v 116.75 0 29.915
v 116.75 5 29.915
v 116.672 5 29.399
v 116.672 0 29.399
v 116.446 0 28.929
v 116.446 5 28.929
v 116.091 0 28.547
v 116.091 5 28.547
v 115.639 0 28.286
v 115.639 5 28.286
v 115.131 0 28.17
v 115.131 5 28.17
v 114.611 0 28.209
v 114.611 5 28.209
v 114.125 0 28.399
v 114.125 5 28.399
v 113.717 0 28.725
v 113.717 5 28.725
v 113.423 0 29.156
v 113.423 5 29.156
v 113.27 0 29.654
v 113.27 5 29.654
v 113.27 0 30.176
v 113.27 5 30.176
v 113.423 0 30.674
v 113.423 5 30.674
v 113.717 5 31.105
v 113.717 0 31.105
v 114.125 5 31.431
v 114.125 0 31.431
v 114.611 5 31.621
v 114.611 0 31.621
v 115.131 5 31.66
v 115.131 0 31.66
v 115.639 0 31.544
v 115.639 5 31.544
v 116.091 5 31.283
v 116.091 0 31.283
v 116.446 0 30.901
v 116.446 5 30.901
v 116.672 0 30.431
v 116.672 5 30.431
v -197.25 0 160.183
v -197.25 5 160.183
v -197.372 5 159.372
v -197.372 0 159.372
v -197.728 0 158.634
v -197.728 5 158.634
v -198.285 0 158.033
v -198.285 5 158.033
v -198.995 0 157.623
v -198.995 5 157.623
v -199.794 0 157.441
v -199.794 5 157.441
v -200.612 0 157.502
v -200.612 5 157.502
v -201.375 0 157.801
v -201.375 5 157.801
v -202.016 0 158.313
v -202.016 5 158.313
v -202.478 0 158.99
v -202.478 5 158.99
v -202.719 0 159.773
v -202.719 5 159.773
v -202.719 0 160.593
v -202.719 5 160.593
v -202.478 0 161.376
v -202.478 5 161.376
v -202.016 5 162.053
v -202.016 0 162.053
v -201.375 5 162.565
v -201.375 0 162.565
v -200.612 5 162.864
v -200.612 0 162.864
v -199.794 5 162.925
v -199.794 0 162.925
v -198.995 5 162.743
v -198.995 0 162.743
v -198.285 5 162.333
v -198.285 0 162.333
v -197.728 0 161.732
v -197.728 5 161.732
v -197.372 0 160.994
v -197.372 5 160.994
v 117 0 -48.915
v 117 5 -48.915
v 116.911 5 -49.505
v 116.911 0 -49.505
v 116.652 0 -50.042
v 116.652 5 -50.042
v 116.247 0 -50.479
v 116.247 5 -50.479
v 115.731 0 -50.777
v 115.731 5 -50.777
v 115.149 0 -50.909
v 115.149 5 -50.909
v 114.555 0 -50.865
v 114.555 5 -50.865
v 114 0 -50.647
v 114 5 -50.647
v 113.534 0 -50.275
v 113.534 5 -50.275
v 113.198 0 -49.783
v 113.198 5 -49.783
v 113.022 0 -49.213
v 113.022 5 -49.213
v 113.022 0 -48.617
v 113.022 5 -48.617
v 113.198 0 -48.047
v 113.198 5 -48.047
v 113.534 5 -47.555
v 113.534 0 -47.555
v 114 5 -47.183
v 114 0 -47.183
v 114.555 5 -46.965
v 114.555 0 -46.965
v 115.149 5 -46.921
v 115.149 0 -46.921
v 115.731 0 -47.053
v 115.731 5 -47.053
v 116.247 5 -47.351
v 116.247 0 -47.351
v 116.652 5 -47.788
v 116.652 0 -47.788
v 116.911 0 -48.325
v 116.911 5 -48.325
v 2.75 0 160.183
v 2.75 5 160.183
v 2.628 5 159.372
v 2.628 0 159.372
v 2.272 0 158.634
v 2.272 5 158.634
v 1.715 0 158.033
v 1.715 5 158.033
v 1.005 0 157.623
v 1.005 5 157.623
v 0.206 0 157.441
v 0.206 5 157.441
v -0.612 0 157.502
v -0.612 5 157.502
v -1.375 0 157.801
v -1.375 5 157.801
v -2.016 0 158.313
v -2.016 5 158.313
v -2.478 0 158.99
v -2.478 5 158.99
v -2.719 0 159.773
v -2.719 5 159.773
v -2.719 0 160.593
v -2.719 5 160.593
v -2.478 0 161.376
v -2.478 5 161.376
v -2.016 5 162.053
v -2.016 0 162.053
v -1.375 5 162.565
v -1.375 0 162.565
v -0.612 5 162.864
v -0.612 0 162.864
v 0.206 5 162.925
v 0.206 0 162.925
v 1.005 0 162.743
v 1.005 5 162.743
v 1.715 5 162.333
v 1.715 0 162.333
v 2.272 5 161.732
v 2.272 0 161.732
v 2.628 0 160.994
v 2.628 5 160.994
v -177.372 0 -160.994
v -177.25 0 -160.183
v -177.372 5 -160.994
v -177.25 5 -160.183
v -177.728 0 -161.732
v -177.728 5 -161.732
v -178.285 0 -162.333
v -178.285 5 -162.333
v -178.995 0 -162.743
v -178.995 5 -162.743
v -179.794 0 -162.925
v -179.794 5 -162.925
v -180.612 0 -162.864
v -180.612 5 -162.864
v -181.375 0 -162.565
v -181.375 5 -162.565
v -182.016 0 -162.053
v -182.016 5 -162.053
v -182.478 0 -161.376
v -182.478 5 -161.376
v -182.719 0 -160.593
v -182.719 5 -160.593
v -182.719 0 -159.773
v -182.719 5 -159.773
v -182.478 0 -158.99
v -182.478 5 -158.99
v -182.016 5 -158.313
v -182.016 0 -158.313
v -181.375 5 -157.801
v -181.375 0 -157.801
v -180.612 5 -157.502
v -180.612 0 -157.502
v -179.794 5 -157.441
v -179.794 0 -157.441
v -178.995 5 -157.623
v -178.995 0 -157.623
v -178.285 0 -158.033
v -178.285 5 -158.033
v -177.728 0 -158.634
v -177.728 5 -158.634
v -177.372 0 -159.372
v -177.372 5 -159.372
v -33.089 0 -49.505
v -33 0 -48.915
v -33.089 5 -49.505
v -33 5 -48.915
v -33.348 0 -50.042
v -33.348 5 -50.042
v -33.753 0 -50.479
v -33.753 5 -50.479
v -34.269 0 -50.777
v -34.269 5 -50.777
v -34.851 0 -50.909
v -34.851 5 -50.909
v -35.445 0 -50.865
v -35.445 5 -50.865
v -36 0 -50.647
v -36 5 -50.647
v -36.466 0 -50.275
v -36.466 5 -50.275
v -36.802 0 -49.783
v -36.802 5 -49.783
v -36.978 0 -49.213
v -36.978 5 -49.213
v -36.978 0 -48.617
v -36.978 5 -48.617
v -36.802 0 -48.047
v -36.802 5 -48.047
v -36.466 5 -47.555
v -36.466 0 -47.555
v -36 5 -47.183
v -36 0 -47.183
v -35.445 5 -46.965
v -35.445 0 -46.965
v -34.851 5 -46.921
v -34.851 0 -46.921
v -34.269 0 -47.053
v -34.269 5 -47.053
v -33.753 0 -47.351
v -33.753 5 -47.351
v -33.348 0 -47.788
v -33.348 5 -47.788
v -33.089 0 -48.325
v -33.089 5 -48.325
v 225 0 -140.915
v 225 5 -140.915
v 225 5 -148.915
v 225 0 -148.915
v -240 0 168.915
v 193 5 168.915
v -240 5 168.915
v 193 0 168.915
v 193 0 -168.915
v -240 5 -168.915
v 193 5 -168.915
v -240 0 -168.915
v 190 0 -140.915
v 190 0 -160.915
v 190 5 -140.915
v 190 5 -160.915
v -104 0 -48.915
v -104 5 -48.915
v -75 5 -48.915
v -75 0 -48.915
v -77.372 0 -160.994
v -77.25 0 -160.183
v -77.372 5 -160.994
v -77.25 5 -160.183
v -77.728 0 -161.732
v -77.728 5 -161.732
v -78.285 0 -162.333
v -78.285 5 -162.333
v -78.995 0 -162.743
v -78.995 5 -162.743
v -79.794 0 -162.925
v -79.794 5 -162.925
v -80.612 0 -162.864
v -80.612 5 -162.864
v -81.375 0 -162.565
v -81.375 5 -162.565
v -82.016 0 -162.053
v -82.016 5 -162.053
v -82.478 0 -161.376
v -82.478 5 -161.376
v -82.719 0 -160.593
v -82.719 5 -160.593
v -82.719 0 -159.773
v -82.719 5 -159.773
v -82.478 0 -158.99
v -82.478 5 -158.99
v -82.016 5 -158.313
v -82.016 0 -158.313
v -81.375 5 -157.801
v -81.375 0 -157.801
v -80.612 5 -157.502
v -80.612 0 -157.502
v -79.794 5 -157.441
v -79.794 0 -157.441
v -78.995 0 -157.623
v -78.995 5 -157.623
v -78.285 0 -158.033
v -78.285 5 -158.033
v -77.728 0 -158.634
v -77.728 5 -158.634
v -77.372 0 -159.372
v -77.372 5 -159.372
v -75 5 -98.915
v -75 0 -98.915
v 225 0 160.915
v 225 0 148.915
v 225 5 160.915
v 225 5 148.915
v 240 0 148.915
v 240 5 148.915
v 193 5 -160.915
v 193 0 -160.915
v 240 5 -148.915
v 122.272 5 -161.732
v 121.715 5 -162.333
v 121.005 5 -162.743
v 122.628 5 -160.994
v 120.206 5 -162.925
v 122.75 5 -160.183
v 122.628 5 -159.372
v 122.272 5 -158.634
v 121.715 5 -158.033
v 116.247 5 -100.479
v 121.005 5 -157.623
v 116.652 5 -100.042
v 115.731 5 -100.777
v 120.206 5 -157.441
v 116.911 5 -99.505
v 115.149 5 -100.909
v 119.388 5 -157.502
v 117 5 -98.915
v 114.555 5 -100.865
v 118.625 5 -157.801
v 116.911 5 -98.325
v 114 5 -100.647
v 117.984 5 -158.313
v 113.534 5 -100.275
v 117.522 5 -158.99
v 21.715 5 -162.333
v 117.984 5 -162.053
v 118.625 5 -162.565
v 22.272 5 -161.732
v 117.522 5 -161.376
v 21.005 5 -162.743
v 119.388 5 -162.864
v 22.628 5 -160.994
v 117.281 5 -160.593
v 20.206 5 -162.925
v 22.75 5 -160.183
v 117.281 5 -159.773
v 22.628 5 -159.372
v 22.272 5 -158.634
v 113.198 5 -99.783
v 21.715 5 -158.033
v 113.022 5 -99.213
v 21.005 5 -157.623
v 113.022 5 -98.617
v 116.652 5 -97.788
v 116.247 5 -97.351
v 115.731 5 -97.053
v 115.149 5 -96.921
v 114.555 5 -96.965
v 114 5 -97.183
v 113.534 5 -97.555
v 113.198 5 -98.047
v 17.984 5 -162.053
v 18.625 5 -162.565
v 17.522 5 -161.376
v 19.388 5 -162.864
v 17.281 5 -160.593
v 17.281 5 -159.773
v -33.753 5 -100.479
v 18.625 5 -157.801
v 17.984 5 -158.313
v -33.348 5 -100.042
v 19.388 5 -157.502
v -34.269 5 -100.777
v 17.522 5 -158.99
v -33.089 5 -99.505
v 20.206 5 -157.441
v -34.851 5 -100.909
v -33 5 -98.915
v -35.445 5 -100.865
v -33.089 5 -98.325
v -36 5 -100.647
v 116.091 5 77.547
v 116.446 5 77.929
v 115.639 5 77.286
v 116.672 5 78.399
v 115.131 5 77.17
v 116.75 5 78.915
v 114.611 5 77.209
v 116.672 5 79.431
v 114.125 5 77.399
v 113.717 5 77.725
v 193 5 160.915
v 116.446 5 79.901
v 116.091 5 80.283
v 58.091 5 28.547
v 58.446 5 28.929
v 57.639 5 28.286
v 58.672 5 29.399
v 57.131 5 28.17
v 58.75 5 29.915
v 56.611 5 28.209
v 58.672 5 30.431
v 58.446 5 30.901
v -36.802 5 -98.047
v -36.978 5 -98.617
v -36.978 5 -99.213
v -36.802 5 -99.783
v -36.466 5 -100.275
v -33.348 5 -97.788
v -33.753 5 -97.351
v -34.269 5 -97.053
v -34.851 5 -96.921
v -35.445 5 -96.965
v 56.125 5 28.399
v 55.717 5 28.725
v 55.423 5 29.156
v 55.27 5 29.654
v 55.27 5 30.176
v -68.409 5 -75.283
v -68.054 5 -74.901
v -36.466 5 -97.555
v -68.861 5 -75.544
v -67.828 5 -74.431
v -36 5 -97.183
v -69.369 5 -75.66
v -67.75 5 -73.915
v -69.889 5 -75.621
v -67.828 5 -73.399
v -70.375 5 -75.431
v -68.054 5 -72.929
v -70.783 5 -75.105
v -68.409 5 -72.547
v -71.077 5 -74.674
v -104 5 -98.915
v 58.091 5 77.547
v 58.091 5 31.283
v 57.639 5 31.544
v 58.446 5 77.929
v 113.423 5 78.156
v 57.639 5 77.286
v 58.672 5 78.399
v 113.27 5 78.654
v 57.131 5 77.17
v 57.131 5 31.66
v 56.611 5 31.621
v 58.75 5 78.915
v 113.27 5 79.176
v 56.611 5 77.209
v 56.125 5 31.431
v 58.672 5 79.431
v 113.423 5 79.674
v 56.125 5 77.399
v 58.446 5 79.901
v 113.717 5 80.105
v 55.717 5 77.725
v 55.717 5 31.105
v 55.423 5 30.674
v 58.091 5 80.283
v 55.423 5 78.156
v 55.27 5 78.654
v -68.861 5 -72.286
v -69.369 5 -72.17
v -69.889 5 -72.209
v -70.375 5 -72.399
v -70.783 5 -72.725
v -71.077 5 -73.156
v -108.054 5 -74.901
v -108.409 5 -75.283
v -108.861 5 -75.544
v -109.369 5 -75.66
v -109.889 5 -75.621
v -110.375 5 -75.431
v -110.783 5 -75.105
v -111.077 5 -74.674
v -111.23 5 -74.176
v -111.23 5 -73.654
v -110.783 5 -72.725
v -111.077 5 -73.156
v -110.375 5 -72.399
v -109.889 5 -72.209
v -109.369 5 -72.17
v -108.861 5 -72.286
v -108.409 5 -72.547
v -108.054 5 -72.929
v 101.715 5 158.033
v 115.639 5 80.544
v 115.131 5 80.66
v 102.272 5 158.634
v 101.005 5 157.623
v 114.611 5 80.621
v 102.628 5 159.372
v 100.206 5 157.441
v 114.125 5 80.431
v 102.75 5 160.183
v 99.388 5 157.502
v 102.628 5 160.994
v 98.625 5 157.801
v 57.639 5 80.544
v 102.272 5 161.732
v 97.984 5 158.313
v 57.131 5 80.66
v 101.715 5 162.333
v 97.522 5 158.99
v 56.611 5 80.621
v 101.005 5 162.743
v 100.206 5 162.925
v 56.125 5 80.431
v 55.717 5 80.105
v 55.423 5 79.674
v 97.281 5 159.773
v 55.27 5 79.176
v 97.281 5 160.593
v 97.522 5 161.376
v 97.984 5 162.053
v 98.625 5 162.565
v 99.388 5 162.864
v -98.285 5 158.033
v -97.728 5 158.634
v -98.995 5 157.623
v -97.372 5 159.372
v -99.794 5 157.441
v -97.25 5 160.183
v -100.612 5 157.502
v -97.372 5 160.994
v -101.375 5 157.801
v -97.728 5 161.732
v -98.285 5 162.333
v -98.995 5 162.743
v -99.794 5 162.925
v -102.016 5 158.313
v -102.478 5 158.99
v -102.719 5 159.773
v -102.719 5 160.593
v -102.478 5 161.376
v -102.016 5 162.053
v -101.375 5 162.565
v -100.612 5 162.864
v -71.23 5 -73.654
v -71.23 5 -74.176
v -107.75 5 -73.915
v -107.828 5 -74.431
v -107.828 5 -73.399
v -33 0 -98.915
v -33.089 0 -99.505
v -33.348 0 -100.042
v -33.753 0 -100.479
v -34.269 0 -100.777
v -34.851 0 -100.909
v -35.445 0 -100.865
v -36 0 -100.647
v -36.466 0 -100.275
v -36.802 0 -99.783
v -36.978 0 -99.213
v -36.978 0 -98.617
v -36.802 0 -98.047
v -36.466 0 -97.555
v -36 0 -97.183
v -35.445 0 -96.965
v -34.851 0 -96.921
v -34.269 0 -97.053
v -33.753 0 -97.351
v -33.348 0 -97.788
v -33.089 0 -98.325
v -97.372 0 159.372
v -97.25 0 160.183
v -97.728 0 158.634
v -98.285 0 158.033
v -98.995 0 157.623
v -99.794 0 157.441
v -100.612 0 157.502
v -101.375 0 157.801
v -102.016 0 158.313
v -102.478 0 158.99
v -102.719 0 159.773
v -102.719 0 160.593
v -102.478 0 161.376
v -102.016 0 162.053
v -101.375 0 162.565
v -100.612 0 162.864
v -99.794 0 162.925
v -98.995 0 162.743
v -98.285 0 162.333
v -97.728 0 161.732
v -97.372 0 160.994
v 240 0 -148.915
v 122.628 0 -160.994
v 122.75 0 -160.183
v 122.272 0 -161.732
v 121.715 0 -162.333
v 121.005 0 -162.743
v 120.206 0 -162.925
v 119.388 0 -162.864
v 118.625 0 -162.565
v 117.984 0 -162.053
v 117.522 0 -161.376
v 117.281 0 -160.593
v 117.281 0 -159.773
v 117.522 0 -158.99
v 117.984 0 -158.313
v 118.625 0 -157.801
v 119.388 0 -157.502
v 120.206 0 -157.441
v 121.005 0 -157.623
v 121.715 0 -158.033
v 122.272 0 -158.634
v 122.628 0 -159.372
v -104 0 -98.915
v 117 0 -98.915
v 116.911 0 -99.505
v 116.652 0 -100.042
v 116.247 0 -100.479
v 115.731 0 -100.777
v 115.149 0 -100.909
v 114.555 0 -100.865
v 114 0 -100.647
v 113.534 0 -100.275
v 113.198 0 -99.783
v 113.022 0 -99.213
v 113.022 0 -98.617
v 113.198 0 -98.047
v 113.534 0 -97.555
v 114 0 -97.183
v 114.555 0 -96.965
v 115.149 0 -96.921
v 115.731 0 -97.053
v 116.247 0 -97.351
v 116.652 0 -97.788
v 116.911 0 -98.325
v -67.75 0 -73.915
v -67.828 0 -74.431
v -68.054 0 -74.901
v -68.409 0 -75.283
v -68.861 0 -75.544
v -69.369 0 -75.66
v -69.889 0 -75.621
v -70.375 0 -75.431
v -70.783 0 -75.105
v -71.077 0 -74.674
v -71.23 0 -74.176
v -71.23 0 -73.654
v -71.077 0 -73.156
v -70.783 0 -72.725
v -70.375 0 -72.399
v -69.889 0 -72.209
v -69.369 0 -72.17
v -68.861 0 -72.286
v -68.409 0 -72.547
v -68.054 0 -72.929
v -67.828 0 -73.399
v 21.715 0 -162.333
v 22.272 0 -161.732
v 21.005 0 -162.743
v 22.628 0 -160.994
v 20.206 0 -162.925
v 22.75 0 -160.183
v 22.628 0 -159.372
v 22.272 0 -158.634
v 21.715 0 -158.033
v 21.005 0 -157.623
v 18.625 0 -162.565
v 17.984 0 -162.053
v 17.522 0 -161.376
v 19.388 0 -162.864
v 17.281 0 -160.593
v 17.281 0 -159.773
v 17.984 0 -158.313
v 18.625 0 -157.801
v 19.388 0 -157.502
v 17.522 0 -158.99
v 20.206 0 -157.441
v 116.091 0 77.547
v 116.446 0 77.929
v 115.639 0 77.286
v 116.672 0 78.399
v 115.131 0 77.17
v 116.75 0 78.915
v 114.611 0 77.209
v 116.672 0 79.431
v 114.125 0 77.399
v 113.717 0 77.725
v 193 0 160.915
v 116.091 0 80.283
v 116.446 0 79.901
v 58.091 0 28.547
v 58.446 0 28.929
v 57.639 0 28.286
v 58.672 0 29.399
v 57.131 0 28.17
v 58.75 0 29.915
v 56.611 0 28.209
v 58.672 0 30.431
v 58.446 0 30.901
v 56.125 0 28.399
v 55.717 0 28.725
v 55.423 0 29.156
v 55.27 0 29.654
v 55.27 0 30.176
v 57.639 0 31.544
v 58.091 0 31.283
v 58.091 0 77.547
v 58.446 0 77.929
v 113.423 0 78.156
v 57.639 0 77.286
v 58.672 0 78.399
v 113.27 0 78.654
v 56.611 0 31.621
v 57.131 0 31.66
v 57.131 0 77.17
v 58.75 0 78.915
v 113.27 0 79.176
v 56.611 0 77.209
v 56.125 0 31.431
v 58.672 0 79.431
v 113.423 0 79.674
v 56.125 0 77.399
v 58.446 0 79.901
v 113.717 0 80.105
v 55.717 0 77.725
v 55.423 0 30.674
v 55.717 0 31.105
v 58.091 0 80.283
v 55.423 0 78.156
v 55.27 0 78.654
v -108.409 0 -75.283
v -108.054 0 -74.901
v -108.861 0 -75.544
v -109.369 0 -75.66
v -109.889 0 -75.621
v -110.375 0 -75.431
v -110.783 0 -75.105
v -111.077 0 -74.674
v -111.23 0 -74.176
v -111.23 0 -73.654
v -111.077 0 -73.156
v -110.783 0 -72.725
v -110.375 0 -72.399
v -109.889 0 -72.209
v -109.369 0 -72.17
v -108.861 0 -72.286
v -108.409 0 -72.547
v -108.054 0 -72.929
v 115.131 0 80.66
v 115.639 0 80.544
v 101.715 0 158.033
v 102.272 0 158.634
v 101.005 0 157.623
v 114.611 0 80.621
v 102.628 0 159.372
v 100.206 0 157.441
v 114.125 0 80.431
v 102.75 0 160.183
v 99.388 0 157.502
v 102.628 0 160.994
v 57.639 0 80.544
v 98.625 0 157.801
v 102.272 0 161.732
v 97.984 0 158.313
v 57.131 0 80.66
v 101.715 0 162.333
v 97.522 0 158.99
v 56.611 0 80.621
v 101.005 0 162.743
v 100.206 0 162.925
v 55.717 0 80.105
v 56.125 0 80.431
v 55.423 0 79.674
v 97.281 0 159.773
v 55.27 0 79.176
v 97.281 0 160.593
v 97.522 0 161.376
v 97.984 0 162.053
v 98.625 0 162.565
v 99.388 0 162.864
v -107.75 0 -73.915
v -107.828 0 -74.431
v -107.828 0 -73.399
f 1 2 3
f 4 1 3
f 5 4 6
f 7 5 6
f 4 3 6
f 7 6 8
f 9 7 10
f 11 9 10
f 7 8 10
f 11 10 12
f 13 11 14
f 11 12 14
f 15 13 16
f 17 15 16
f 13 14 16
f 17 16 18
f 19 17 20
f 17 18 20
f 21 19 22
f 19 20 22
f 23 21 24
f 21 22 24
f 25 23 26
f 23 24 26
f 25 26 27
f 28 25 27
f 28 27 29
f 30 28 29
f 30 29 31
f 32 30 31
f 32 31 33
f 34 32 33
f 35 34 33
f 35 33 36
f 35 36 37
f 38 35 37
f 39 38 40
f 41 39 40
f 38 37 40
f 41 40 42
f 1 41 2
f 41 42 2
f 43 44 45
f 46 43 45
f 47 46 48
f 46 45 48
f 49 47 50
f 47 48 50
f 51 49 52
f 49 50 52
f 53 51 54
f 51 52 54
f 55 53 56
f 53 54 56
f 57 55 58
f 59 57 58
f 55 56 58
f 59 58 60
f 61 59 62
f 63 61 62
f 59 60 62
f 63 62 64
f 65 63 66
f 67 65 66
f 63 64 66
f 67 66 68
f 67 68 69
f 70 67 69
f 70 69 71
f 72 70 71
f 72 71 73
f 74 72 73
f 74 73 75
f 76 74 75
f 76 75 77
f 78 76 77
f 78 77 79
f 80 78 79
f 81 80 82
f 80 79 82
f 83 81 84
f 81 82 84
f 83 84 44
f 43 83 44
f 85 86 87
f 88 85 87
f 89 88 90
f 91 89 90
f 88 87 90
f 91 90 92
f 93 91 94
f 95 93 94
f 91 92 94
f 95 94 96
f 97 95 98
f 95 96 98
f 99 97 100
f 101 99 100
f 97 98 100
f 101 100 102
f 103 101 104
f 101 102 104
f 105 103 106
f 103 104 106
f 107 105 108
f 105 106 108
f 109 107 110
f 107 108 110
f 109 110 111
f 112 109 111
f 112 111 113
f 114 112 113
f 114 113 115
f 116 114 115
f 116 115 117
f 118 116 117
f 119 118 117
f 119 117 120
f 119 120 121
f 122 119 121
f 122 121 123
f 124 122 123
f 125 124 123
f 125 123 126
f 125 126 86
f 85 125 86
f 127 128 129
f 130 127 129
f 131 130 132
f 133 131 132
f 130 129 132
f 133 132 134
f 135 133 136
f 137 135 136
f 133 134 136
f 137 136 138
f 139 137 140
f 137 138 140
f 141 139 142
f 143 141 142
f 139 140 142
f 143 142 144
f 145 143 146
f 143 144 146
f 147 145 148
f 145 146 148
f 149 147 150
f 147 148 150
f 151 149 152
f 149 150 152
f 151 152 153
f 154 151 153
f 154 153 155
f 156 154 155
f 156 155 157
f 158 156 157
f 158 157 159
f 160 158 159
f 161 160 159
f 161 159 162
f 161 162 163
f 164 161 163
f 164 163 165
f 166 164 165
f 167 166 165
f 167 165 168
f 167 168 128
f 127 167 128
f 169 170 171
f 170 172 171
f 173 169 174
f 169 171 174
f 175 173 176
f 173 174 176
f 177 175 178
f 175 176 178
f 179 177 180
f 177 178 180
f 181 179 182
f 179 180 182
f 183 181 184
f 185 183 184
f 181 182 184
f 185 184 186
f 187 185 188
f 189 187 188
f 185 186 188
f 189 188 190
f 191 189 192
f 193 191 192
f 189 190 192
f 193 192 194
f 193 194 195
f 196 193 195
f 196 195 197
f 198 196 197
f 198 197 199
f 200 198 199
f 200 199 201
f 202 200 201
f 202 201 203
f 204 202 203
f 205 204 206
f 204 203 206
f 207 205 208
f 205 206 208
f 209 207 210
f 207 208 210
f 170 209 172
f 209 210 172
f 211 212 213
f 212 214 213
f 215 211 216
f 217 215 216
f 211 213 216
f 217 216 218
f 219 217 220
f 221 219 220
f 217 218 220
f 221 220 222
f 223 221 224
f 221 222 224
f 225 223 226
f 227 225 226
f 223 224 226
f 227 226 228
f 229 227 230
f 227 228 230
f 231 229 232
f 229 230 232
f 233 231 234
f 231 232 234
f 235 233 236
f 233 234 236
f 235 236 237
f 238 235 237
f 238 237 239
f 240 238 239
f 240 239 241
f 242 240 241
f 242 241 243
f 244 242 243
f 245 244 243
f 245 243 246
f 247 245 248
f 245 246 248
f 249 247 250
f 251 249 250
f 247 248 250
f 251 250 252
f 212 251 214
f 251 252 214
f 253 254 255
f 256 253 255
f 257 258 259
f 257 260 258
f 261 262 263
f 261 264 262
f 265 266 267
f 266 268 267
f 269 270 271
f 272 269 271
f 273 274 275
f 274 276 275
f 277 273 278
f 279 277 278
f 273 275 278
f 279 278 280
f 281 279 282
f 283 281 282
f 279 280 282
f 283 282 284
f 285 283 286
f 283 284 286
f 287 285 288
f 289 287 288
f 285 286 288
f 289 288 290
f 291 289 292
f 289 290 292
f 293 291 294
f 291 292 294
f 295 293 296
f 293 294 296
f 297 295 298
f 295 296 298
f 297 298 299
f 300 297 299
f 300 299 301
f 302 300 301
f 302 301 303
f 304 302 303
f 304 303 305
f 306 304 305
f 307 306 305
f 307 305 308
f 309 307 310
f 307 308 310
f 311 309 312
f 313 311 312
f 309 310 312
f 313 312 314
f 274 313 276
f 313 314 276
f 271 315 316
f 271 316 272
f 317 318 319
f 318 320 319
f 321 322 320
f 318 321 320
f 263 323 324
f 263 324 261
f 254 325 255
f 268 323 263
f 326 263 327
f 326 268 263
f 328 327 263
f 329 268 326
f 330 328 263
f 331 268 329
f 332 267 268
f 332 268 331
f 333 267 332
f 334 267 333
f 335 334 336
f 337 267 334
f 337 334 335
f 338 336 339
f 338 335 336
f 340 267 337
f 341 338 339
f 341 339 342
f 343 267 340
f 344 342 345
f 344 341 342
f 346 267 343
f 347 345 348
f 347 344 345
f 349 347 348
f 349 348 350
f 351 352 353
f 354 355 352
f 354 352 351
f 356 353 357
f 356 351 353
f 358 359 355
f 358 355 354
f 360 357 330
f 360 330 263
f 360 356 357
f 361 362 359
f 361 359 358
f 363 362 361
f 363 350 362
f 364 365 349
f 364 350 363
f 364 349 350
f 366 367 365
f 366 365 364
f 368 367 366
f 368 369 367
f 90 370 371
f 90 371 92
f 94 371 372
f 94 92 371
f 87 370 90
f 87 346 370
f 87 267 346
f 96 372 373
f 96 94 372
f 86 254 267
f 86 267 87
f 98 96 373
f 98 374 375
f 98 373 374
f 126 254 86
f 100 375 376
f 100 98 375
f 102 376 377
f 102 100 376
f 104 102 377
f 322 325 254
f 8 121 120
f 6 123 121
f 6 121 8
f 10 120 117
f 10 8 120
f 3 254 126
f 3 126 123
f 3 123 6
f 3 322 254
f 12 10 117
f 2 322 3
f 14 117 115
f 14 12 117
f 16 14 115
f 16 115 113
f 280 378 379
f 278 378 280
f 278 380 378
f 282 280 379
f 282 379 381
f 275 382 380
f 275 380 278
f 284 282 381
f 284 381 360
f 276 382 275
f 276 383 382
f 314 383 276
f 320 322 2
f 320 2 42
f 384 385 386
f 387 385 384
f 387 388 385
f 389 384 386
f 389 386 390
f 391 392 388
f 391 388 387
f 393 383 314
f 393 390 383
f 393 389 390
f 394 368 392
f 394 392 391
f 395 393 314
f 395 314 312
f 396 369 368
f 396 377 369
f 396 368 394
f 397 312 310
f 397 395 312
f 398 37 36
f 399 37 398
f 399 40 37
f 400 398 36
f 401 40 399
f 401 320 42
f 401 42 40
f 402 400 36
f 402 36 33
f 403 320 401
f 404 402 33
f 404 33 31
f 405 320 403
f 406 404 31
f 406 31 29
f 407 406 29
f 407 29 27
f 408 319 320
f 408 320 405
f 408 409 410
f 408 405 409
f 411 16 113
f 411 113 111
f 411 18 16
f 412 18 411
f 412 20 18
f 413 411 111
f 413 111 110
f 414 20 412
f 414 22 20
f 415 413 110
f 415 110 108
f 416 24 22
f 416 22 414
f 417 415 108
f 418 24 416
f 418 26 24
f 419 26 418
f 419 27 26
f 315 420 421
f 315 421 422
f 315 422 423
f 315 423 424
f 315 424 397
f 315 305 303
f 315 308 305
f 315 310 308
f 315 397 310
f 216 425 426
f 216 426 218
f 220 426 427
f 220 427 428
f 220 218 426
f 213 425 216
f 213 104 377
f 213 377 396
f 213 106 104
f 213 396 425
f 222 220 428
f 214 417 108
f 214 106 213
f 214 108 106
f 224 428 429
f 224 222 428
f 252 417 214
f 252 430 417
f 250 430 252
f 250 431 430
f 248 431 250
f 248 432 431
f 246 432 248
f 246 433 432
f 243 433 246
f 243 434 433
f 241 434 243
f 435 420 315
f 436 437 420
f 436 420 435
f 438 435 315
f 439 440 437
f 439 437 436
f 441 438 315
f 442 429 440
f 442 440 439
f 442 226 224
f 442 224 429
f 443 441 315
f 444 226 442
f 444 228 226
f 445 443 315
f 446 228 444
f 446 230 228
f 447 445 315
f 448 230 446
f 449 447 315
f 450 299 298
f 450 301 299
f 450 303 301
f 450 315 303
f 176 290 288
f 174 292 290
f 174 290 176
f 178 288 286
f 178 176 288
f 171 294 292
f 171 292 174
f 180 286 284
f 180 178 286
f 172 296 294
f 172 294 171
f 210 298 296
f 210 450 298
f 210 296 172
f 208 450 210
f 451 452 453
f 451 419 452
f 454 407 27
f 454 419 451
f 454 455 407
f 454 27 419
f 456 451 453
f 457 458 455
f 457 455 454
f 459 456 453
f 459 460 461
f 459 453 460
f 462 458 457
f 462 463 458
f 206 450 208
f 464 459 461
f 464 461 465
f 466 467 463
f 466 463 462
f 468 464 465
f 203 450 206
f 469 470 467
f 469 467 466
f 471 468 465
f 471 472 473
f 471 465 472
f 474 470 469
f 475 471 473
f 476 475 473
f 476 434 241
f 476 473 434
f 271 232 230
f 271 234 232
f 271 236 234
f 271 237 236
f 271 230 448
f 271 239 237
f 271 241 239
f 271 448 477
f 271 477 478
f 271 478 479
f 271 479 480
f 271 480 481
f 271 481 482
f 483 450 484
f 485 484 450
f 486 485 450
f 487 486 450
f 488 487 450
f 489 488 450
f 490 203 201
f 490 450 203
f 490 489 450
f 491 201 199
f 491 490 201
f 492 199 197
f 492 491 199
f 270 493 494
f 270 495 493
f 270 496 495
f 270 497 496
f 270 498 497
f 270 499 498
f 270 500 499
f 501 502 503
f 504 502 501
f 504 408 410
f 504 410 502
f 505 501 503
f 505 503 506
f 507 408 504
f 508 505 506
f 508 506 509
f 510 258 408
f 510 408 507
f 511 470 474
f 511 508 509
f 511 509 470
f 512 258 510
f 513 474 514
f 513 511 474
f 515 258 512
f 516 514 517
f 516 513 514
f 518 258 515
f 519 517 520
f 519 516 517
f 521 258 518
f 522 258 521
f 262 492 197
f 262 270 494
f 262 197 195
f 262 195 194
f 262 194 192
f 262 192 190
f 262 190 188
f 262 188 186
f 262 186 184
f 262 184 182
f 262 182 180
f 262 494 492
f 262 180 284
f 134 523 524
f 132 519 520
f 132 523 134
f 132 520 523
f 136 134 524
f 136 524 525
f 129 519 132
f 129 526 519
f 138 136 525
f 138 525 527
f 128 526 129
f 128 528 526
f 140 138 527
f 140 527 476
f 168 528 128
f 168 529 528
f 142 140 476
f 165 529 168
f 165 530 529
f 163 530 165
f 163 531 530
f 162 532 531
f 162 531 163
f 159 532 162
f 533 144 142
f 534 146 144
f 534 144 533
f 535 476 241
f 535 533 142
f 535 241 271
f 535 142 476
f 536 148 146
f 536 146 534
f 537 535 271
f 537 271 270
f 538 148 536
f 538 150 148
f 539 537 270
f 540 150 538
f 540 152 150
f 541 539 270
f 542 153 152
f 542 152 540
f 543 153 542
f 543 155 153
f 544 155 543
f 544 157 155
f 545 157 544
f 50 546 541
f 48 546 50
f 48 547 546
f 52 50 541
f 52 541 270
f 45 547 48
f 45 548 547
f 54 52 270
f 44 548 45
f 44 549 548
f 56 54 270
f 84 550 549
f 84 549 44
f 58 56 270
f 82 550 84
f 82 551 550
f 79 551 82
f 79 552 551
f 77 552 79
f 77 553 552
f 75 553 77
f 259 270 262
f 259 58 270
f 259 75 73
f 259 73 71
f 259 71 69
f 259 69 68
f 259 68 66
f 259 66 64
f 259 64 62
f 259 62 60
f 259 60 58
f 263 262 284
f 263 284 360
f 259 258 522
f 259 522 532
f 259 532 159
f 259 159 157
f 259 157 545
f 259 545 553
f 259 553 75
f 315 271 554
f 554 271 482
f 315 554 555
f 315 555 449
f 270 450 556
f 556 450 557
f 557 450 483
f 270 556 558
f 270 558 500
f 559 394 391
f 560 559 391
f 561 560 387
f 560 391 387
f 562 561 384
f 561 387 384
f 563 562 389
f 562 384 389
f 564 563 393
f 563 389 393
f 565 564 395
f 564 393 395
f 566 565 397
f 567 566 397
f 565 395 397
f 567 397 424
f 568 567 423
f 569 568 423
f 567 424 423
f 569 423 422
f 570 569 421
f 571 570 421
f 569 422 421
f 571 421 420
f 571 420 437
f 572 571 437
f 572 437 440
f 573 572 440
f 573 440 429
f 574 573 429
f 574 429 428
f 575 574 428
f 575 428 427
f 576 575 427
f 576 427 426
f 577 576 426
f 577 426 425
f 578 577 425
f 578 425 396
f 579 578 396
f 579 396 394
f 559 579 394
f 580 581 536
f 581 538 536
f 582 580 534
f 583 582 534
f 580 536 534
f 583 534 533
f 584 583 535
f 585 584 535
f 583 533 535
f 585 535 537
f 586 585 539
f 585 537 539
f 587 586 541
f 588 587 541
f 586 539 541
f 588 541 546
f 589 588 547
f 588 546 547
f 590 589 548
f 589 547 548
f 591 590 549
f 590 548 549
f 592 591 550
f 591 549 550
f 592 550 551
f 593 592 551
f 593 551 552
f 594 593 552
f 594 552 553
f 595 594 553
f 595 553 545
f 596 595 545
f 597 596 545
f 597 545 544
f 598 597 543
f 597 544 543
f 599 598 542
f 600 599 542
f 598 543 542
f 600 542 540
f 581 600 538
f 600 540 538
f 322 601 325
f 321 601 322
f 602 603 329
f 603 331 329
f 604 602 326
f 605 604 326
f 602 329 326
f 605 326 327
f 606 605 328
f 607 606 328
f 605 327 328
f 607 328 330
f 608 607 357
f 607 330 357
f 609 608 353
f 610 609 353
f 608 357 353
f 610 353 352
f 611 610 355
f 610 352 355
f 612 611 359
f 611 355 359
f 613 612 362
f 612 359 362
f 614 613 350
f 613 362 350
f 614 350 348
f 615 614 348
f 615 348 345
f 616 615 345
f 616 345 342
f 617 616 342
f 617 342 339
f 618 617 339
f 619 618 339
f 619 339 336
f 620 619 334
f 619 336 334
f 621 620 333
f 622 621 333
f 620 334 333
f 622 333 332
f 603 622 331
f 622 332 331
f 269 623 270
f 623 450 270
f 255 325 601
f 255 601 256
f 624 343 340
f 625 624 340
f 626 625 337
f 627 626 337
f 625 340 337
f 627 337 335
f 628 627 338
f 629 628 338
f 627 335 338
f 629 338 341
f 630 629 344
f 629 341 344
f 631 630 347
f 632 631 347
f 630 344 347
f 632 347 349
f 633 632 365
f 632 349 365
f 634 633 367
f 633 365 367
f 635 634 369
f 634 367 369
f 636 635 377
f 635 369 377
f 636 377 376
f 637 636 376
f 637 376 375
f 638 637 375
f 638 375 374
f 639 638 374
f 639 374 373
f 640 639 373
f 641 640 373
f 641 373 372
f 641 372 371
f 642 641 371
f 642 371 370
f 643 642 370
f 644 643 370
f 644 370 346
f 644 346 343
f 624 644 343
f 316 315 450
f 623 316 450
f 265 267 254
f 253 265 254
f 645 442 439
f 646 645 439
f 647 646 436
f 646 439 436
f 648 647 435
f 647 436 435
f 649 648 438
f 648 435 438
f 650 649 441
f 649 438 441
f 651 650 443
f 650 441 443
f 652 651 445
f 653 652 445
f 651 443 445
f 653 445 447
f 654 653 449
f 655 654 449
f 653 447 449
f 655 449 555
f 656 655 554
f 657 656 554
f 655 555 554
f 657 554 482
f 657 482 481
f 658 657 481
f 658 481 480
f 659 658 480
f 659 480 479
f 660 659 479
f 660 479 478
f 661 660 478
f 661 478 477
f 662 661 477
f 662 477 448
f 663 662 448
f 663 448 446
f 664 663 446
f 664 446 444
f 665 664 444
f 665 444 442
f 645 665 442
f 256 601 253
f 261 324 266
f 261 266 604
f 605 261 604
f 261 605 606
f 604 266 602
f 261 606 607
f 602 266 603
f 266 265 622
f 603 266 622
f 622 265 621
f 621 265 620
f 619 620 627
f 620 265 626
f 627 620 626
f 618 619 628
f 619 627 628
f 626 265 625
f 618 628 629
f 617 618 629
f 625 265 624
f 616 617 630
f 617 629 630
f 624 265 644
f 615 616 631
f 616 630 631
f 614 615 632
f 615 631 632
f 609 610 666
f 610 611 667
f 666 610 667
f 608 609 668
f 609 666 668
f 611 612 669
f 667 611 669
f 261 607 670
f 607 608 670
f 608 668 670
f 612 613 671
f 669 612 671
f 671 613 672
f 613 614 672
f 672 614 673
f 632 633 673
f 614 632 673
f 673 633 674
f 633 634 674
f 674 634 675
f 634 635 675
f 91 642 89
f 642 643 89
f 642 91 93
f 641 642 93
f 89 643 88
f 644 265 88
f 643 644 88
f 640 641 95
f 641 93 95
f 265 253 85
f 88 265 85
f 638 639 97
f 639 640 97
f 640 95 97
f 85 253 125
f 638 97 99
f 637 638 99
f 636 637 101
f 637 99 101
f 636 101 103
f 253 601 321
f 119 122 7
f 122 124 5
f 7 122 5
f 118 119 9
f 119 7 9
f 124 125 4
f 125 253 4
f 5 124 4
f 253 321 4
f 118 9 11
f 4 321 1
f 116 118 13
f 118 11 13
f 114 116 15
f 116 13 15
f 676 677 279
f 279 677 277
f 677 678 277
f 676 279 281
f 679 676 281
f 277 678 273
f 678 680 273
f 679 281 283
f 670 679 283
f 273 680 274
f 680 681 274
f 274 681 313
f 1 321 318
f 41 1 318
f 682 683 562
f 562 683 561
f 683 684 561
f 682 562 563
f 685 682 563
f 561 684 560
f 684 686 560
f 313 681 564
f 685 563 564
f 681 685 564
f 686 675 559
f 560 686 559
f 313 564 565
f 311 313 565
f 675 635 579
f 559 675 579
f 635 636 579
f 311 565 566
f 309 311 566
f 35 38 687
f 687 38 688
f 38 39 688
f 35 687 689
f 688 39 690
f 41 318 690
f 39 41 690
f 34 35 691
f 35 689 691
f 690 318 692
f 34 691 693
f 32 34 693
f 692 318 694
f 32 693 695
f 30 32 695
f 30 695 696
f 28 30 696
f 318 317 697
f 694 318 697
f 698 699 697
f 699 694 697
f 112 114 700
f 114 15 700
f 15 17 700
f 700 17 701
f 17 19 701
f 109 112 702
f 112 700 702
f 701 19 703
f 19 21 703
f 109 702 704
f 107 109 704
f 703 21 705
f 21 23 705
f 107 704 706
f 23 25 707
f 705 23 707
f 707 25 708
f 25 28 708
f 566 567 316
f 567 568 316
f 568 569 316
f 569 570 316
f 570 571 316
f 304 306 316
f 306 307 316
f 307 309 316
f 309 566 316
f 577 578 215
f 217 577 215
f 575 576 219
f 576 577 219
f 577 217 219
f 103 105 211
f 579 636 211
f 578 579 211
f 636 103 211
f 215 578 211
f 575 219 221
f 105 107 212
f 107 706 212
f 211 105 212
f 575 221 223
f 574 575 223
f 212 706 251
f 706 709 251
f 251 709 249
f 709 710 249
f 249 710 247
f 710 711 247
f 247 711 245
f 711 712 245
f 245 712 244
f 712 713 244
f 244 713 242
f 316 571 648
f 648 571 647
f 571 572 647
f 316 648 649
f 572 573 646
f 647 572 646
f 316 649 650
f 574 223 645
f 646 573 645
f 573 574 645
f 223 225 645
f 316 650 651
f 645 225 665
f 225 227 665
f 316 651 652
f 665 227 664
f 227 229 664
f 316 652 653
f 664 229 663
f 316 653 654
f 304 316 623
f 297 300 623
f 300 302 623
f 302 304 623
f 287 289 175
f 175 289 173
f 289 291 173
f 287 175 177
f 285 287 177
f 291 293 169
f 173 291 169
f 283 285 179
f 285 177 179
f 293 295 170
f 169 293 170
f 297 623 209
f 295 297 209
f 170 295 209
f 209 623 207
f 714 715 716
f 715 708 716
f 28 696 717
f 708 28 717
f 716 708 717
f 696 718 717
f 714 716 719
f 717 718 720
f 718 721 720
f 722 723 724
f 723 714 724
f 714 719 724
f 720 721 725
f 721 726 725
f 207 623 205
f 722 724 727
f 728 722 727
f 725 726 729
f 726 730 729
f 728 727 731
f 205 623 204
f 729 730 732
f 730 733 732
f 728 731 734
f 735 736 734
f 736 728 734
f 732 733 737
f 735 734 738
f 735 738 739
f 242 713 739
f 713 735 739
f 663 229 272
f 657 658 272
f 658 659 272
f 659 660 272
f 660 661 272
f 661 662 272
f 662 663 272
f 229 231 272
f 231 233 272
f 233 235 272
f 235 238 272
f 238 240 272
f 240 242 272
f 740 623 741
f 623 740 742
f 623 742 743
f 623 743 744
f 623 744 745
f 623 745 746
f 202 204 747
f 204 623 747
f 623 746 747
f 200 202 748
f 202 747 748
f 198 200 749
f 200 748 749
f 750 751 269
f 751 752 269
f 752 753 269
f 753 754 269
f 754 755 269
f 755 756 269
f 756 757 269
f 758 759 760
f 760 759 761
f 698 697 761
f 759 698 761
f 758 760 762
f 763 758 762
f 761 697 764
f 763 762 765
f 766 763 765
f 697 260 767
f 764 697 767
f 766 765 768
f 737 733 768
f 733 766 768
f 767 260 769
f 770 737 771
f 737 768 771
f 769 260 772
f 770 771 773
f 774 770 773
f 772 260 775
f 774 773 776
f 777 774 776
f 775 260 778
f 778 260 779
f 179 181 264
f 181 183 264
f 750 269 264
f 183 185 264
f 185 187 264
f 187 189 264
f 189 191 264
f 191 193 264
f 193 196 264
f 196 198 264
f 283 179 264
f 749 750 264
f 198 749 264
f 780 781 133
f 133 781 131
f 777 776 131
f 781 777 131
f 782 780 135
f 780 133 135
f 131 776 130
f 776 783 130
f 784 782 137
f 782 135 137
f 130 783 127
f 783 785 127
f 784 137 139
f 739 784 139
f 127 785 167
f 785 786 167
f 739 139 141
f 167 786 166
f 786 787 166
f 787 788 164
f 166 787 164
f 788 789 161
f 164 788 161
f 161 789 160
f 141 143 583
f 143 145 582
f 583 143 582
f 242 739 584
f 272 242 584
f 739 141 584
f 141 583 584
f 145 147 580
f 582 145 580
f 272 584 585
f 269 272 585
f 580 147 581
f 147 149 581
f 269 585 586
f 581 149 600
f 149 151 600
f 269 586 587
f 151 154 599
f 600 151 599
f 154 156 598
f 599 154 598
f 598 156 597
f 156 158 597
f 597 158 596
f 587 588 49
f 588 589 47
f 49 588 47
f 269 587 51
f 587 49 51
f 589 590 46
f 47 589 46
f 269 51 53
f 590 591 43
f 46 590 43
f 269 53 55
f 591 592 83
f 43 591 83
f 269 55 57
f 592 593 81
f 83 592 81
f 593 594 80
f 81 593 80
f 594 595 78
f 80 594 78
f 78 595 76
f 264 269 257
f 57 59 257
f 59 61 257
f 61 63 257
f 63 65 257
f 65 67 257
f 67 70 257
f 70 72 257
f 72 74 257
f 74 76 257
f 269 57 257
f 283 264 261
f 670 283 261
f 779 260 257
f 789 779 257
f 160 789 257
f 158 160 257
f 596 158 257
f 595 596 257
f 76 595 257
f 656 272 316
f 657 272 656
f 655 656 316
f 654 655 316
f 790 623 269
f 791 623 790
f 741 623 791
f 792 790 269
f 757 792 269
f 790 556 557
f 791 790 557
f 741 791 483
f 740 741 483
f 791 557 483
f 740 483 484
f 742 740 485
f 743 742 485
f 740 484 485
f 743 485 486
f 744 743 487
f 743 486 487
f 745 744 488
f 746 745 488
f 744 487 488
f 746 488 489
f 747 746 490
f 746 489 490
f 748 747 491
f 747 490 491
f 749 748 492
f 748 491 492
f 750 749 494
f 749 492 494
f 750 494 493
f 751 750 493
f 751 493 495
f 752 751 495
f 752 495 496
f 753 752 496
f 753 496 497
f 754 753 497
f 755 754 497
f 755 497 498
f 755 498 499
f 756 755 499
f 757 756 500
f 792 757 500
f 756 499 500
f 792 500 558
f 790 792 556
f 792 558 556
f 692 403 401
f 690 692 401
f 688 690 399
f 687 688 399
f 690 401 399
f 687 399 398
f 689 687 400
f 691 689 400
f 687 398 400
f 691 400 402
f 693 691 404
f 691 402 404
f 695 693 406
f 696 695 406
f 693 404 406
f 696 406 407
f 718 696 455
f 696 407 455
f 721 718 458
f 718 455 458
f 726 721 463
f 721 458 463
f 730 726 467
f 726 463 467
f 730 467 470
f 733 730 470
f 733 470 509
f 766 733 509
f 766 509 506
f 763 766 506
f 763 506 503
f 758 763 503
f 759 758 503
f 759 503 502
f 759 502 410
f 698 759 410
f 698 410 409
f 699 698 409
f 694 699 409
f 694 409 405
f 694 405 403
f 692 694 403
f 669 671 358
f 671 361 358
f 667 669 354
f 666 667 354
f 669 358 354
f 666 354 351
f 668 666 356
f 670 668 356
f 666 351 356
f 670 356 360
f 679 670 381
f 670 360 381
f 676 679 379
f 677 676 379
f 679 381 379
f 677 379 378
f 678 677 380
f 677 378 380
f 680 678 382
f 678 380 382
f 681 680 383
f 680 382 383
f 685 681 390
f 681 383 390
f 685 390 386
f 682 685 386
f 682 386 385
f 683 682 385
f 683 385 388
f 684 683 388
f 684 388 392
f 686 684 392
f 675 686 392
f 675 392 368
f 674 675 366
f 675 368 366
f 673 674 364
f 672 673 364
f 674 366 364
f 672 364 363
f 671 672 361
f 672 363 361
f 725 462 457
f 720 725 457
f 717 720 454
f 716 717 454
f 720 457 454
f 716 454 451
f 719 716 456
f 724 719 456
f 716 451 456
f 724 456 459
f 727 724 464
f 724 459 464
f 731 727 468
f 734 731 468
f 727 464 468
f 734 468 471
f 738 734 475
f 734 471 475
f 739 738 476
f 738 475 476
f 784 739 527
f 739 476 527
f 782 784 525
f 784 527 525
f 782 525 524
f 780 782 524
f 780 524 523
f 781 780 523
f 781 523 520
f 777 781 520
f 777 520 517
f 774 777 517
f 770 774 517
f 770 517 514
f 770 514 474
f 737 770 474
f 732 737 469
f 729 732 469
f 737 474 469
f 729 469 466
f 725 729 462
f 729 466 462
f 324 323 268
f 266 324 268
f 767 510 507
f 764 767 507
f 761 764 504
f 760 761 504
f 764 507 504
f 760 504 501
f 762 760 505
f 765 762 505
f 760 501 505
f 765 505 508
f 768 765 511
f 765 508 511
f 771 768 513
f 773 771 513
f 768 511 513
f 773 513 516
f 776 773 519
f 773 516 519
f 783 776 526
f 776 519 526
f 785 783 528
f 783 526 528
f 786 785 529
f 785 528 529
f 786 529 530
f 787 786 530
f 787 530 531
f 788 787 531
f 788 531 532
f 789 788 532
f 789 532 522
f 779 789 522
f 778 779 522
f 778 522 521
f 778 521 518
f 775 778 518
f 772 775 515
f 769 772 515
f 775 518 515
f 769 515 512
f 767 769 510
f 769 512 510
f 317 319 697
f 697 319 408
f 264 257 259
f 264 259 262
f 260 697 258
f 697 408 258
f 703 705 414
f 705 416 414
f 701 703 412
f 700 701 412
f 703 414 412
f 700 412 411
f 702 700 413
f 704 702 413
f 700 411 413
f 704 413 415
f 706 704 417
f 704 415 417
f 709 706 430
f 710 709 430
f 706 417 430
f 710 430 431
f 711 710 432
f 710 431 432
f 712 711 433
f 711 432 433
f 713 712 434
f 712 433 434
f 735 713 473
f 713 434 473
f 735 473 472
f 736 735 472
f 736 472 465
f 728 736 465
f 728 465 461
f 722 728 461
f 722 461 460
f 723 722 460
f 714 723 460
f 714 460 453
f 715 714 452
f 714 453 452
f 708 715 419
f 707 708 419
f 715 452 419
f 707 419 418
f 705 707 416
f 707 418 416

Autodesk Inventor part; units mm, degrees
ref_plane "YZ Plane" through (0, 0, 0) normal (1, 0, 0) x (0, 1, 0)
ref_plane "XZ Plane" through (0, 0, 0) normal (0, 1, 0) x (-1, 0, 0)
ref_plane "XY Plane" through (0, 0, 0) normal (0, 0, 1) x (1, 0, 0)
sketch "Sketch1" plane through (0, 0, 0) normal (0, 1, 0) x (-1, 0, 0)
  line L0 (-240, 168.915) -> (240, 168.915)
  line L1 (240, 168.915) -> (240, -168.915)
  line L2 (240, -168.915) -> (-240, -168.915)
  line L3 (-240, -168.915) -> (-240, 168.915)
  line L4 (-240, 168.915) -> (240, -168.915) construction
  line L5 (240, 168.915) -> (-240, -168.915) construction
  point P0 (0, 0)
  dimension "d0" = 480
  dimension "d1" = 337.83
extrude "Extrusion1" add sketch "Sketch1" along normal blind 5
sketch "Sketch2" plane through (0, 5, 0) normal (0, 1, 0) x (1, 0, 0)
  line L0 (240, -168.915) -> (240, 168.915) projected
  line L1 (240, -168.915) -> (240, -148.915)
  line L2 (240, -148.915) -> (225, -148.915)
  line L3 (-240, -168.915) -> (240, -168.915) projected
  line L4 (225, -168.915) -> (225, -160.915)
  line L5 (225, -168.915) -> (233, -168.915) construction
  line L6 (225, -148.915) -> (225, -160.915)
  line L7 (225, -160.915) -> (193, -160.915)
  line L8 (193, -160.915) -> (193, -168.915)
  line L9 (193, -168.915) -> (240, -168.915)
  line L10 (240, 0) -> (160.3142, 0)
  line L11 (240, 168.915) -> (240, 148.915)
  line L12 (240, 148.915) -> (225, 148.915)
  line L13 (225, 168.915) -> (225, 160.915)
  line L14 (225, 168.915) -> (233, 168.915) construction
  line L15 (225, 148.915) -> (225, 160.915)
  line L16 (225, 160.915) -> (193, 160.915)
  line L17 (193, 160.915) -> (193, 168.915)
  line L18 (193, 168.915) -> (240, 168.915)
  point P0 (0, 0)
  dimension "d4" = 20
  dimension "d5" = 15
  dimension "d6" = 8
  dimension "d7" = 90
  dimension "d8" = 12
  dimension "d9" = 32
extrude "Extrusion2" cut sketch "Sketch2" against normal blind 5
sketch "Sketch4" plane through (0, 5, 0) normal (0, 1, 0) x (1, 0, 0)
  line L0 (-240, -168.915) -> (193, -168.915) projected
  line L1 (-240, -168.915) -> (-200, -168.915)
  line L2 (-200, -168.915) -> (-200, -160.183)
  circle A0 centre (-200, -160.183) radius 2.75
  circle A1 centre (-100, -160.183) radius 2.75
  circle A2 centre (0, -160.183) radius 2.75
  circle A3 centre (100, -160.183) radius 2.75
  line L3 (193, 168.915) -> (-240, 168.915) projected
  line L4 (-240, 168.915) -> (-180, 168.915)
  line L5 (-180, 168.915) -> (-180, 160.183)
  circle A4 centre (-180, 160.183) radius 2.75
  circle A5 centre (-80, 160.183) radius 2.75
  circle A6 centre (20, 160.183) radius 2.75
  circle A7 centre (120, 160.183) radius 2.75
  point P0 (0, 0)
  dimension "d14" = 40
  dimension "d15" = 8.732
  dimension "d16" = 5.5
  dimension "d19" = 100
  dimension "d24" = 60
  dimension "d25" = 8.732
  dimension "d26" = 5.5
  dimension "d29" = 100
extrude "Extrusion3" cut sketch "Sketch4" against normal blind 10
sketch "Sketch5" plane through (0, 5, 0) normal (0, 1, 0) x (1, 0, 0)
  line L0 (193, 168.915) -> (-240, 168.915) projected
  line L1 (-240, 168.915) -> (240, 168.915)
  line L2 (240, 168.915) -> (240, -170.085)
  line L3 (240, -170.085) -> (-240, -170.085)
  line L4 (-240, -170.085) -> (-240, 168.915)
  point P0 (0, 0)
  dimension "d36" = 480
  dimension "d37" = 339
sketch "Sketch8" plane through (0, 5, 0) normal (0, 1, 0) x (1, 0, 0)
  line L0 (193, 160.915) -> (225, 160.915) projected
  line L1 (225, 160.915) -> (190, 160.915)
  line L2 (190, 160.915) -> (190, 140.915)
  line L3 (190, 140.915) -> (225, 140.915)
  line L4 (225, 140.915) -> (225, 160.915)
  point P0 (0, 0)
  dimension "d38" = 35
  dimension "d39" = 20
extrude "Extrusion4" cut sketch "Sketch8" against normal blind 10
sketch "Sketch9" plane through (0, 5, 0) normal (0, 1, 0) x (1, 0, 0)
  circle A0 centre (115, 98.915) radius 2
  line L0 (193, 168.915) -> (-240, 168.915) projected
  line L1 (240, -148.915) -> (240, 148.915) projected
  circle A1 centre (115, 48.915) radius 2
  circle A2 centre (-35, 98.915) radius 2
  circle A3 centre (-35, 48.915) radius 2
  line L2 (-35, 98.915) -> (-75, 98.915)
  line L3 (-35, 98.915) -> (5, 98.915) construction
  line L4 (-75, 98.915) -> (-75, 83.915)
  line L5 (-75, 83.915) -> (-75, 98.915)
  line L6 (-75, 98.915) -> (-104, 98.915)
  line L7 (-104, 98.915) -> (-104, 48.915)
  line L8 (-104, 48.915) -> (-75, 48.915)
  line L9 (-75, 48.915) -> (-75, 98.915)
  line L10 (-104, 73.915) -> (-109.5, 73.915)
  line L11 (-75, 73.915) -> (-69.5, 73.915)
  circle A4 centre (-69.5, 73.915) radius 1.75
  circle A5 centre (-109.5, 73.915) radius 1.75
  circle A6 centre (115, -78.915) radius 1.75
  line L12 (-240, -168.915) -> (193, -168.915) projected
  circle A7 centre (57, -78.915) radius 1.75
  circle A8 centre (115, -29.915) radius 1.75
  circle A9 centre (57, -29.915) radius 1.75
  point P0 (0, 0)
  dimension "d42" = 4
  dimension "d43" = 70
  dimension "d44" = 125
  dimension "d47" = 50
  dimension "d50" = 150
  dimension "d53" = 40
  dimension "d54" = 180
  dimension "d55" = 15
  dimension "d56" = 15
  dimension "d57" = 29
  dimension "d58" = 50
  dimension "d59" = 5.5
  dimension "d60" = 5.5
  dimension "d61" = 3.5
  dimension "d62" = 3.5
  dimension "d63" = 3.5
  dimension "d64" = 90
  dimension "d65" = 125
  dimension "d68" = 58
  dimension "d71" = 49
extrude "Extrusion5" cut sketch "Sketch9" against normal blind 10
properties part number "Acrylic_Panel_Mounts"
